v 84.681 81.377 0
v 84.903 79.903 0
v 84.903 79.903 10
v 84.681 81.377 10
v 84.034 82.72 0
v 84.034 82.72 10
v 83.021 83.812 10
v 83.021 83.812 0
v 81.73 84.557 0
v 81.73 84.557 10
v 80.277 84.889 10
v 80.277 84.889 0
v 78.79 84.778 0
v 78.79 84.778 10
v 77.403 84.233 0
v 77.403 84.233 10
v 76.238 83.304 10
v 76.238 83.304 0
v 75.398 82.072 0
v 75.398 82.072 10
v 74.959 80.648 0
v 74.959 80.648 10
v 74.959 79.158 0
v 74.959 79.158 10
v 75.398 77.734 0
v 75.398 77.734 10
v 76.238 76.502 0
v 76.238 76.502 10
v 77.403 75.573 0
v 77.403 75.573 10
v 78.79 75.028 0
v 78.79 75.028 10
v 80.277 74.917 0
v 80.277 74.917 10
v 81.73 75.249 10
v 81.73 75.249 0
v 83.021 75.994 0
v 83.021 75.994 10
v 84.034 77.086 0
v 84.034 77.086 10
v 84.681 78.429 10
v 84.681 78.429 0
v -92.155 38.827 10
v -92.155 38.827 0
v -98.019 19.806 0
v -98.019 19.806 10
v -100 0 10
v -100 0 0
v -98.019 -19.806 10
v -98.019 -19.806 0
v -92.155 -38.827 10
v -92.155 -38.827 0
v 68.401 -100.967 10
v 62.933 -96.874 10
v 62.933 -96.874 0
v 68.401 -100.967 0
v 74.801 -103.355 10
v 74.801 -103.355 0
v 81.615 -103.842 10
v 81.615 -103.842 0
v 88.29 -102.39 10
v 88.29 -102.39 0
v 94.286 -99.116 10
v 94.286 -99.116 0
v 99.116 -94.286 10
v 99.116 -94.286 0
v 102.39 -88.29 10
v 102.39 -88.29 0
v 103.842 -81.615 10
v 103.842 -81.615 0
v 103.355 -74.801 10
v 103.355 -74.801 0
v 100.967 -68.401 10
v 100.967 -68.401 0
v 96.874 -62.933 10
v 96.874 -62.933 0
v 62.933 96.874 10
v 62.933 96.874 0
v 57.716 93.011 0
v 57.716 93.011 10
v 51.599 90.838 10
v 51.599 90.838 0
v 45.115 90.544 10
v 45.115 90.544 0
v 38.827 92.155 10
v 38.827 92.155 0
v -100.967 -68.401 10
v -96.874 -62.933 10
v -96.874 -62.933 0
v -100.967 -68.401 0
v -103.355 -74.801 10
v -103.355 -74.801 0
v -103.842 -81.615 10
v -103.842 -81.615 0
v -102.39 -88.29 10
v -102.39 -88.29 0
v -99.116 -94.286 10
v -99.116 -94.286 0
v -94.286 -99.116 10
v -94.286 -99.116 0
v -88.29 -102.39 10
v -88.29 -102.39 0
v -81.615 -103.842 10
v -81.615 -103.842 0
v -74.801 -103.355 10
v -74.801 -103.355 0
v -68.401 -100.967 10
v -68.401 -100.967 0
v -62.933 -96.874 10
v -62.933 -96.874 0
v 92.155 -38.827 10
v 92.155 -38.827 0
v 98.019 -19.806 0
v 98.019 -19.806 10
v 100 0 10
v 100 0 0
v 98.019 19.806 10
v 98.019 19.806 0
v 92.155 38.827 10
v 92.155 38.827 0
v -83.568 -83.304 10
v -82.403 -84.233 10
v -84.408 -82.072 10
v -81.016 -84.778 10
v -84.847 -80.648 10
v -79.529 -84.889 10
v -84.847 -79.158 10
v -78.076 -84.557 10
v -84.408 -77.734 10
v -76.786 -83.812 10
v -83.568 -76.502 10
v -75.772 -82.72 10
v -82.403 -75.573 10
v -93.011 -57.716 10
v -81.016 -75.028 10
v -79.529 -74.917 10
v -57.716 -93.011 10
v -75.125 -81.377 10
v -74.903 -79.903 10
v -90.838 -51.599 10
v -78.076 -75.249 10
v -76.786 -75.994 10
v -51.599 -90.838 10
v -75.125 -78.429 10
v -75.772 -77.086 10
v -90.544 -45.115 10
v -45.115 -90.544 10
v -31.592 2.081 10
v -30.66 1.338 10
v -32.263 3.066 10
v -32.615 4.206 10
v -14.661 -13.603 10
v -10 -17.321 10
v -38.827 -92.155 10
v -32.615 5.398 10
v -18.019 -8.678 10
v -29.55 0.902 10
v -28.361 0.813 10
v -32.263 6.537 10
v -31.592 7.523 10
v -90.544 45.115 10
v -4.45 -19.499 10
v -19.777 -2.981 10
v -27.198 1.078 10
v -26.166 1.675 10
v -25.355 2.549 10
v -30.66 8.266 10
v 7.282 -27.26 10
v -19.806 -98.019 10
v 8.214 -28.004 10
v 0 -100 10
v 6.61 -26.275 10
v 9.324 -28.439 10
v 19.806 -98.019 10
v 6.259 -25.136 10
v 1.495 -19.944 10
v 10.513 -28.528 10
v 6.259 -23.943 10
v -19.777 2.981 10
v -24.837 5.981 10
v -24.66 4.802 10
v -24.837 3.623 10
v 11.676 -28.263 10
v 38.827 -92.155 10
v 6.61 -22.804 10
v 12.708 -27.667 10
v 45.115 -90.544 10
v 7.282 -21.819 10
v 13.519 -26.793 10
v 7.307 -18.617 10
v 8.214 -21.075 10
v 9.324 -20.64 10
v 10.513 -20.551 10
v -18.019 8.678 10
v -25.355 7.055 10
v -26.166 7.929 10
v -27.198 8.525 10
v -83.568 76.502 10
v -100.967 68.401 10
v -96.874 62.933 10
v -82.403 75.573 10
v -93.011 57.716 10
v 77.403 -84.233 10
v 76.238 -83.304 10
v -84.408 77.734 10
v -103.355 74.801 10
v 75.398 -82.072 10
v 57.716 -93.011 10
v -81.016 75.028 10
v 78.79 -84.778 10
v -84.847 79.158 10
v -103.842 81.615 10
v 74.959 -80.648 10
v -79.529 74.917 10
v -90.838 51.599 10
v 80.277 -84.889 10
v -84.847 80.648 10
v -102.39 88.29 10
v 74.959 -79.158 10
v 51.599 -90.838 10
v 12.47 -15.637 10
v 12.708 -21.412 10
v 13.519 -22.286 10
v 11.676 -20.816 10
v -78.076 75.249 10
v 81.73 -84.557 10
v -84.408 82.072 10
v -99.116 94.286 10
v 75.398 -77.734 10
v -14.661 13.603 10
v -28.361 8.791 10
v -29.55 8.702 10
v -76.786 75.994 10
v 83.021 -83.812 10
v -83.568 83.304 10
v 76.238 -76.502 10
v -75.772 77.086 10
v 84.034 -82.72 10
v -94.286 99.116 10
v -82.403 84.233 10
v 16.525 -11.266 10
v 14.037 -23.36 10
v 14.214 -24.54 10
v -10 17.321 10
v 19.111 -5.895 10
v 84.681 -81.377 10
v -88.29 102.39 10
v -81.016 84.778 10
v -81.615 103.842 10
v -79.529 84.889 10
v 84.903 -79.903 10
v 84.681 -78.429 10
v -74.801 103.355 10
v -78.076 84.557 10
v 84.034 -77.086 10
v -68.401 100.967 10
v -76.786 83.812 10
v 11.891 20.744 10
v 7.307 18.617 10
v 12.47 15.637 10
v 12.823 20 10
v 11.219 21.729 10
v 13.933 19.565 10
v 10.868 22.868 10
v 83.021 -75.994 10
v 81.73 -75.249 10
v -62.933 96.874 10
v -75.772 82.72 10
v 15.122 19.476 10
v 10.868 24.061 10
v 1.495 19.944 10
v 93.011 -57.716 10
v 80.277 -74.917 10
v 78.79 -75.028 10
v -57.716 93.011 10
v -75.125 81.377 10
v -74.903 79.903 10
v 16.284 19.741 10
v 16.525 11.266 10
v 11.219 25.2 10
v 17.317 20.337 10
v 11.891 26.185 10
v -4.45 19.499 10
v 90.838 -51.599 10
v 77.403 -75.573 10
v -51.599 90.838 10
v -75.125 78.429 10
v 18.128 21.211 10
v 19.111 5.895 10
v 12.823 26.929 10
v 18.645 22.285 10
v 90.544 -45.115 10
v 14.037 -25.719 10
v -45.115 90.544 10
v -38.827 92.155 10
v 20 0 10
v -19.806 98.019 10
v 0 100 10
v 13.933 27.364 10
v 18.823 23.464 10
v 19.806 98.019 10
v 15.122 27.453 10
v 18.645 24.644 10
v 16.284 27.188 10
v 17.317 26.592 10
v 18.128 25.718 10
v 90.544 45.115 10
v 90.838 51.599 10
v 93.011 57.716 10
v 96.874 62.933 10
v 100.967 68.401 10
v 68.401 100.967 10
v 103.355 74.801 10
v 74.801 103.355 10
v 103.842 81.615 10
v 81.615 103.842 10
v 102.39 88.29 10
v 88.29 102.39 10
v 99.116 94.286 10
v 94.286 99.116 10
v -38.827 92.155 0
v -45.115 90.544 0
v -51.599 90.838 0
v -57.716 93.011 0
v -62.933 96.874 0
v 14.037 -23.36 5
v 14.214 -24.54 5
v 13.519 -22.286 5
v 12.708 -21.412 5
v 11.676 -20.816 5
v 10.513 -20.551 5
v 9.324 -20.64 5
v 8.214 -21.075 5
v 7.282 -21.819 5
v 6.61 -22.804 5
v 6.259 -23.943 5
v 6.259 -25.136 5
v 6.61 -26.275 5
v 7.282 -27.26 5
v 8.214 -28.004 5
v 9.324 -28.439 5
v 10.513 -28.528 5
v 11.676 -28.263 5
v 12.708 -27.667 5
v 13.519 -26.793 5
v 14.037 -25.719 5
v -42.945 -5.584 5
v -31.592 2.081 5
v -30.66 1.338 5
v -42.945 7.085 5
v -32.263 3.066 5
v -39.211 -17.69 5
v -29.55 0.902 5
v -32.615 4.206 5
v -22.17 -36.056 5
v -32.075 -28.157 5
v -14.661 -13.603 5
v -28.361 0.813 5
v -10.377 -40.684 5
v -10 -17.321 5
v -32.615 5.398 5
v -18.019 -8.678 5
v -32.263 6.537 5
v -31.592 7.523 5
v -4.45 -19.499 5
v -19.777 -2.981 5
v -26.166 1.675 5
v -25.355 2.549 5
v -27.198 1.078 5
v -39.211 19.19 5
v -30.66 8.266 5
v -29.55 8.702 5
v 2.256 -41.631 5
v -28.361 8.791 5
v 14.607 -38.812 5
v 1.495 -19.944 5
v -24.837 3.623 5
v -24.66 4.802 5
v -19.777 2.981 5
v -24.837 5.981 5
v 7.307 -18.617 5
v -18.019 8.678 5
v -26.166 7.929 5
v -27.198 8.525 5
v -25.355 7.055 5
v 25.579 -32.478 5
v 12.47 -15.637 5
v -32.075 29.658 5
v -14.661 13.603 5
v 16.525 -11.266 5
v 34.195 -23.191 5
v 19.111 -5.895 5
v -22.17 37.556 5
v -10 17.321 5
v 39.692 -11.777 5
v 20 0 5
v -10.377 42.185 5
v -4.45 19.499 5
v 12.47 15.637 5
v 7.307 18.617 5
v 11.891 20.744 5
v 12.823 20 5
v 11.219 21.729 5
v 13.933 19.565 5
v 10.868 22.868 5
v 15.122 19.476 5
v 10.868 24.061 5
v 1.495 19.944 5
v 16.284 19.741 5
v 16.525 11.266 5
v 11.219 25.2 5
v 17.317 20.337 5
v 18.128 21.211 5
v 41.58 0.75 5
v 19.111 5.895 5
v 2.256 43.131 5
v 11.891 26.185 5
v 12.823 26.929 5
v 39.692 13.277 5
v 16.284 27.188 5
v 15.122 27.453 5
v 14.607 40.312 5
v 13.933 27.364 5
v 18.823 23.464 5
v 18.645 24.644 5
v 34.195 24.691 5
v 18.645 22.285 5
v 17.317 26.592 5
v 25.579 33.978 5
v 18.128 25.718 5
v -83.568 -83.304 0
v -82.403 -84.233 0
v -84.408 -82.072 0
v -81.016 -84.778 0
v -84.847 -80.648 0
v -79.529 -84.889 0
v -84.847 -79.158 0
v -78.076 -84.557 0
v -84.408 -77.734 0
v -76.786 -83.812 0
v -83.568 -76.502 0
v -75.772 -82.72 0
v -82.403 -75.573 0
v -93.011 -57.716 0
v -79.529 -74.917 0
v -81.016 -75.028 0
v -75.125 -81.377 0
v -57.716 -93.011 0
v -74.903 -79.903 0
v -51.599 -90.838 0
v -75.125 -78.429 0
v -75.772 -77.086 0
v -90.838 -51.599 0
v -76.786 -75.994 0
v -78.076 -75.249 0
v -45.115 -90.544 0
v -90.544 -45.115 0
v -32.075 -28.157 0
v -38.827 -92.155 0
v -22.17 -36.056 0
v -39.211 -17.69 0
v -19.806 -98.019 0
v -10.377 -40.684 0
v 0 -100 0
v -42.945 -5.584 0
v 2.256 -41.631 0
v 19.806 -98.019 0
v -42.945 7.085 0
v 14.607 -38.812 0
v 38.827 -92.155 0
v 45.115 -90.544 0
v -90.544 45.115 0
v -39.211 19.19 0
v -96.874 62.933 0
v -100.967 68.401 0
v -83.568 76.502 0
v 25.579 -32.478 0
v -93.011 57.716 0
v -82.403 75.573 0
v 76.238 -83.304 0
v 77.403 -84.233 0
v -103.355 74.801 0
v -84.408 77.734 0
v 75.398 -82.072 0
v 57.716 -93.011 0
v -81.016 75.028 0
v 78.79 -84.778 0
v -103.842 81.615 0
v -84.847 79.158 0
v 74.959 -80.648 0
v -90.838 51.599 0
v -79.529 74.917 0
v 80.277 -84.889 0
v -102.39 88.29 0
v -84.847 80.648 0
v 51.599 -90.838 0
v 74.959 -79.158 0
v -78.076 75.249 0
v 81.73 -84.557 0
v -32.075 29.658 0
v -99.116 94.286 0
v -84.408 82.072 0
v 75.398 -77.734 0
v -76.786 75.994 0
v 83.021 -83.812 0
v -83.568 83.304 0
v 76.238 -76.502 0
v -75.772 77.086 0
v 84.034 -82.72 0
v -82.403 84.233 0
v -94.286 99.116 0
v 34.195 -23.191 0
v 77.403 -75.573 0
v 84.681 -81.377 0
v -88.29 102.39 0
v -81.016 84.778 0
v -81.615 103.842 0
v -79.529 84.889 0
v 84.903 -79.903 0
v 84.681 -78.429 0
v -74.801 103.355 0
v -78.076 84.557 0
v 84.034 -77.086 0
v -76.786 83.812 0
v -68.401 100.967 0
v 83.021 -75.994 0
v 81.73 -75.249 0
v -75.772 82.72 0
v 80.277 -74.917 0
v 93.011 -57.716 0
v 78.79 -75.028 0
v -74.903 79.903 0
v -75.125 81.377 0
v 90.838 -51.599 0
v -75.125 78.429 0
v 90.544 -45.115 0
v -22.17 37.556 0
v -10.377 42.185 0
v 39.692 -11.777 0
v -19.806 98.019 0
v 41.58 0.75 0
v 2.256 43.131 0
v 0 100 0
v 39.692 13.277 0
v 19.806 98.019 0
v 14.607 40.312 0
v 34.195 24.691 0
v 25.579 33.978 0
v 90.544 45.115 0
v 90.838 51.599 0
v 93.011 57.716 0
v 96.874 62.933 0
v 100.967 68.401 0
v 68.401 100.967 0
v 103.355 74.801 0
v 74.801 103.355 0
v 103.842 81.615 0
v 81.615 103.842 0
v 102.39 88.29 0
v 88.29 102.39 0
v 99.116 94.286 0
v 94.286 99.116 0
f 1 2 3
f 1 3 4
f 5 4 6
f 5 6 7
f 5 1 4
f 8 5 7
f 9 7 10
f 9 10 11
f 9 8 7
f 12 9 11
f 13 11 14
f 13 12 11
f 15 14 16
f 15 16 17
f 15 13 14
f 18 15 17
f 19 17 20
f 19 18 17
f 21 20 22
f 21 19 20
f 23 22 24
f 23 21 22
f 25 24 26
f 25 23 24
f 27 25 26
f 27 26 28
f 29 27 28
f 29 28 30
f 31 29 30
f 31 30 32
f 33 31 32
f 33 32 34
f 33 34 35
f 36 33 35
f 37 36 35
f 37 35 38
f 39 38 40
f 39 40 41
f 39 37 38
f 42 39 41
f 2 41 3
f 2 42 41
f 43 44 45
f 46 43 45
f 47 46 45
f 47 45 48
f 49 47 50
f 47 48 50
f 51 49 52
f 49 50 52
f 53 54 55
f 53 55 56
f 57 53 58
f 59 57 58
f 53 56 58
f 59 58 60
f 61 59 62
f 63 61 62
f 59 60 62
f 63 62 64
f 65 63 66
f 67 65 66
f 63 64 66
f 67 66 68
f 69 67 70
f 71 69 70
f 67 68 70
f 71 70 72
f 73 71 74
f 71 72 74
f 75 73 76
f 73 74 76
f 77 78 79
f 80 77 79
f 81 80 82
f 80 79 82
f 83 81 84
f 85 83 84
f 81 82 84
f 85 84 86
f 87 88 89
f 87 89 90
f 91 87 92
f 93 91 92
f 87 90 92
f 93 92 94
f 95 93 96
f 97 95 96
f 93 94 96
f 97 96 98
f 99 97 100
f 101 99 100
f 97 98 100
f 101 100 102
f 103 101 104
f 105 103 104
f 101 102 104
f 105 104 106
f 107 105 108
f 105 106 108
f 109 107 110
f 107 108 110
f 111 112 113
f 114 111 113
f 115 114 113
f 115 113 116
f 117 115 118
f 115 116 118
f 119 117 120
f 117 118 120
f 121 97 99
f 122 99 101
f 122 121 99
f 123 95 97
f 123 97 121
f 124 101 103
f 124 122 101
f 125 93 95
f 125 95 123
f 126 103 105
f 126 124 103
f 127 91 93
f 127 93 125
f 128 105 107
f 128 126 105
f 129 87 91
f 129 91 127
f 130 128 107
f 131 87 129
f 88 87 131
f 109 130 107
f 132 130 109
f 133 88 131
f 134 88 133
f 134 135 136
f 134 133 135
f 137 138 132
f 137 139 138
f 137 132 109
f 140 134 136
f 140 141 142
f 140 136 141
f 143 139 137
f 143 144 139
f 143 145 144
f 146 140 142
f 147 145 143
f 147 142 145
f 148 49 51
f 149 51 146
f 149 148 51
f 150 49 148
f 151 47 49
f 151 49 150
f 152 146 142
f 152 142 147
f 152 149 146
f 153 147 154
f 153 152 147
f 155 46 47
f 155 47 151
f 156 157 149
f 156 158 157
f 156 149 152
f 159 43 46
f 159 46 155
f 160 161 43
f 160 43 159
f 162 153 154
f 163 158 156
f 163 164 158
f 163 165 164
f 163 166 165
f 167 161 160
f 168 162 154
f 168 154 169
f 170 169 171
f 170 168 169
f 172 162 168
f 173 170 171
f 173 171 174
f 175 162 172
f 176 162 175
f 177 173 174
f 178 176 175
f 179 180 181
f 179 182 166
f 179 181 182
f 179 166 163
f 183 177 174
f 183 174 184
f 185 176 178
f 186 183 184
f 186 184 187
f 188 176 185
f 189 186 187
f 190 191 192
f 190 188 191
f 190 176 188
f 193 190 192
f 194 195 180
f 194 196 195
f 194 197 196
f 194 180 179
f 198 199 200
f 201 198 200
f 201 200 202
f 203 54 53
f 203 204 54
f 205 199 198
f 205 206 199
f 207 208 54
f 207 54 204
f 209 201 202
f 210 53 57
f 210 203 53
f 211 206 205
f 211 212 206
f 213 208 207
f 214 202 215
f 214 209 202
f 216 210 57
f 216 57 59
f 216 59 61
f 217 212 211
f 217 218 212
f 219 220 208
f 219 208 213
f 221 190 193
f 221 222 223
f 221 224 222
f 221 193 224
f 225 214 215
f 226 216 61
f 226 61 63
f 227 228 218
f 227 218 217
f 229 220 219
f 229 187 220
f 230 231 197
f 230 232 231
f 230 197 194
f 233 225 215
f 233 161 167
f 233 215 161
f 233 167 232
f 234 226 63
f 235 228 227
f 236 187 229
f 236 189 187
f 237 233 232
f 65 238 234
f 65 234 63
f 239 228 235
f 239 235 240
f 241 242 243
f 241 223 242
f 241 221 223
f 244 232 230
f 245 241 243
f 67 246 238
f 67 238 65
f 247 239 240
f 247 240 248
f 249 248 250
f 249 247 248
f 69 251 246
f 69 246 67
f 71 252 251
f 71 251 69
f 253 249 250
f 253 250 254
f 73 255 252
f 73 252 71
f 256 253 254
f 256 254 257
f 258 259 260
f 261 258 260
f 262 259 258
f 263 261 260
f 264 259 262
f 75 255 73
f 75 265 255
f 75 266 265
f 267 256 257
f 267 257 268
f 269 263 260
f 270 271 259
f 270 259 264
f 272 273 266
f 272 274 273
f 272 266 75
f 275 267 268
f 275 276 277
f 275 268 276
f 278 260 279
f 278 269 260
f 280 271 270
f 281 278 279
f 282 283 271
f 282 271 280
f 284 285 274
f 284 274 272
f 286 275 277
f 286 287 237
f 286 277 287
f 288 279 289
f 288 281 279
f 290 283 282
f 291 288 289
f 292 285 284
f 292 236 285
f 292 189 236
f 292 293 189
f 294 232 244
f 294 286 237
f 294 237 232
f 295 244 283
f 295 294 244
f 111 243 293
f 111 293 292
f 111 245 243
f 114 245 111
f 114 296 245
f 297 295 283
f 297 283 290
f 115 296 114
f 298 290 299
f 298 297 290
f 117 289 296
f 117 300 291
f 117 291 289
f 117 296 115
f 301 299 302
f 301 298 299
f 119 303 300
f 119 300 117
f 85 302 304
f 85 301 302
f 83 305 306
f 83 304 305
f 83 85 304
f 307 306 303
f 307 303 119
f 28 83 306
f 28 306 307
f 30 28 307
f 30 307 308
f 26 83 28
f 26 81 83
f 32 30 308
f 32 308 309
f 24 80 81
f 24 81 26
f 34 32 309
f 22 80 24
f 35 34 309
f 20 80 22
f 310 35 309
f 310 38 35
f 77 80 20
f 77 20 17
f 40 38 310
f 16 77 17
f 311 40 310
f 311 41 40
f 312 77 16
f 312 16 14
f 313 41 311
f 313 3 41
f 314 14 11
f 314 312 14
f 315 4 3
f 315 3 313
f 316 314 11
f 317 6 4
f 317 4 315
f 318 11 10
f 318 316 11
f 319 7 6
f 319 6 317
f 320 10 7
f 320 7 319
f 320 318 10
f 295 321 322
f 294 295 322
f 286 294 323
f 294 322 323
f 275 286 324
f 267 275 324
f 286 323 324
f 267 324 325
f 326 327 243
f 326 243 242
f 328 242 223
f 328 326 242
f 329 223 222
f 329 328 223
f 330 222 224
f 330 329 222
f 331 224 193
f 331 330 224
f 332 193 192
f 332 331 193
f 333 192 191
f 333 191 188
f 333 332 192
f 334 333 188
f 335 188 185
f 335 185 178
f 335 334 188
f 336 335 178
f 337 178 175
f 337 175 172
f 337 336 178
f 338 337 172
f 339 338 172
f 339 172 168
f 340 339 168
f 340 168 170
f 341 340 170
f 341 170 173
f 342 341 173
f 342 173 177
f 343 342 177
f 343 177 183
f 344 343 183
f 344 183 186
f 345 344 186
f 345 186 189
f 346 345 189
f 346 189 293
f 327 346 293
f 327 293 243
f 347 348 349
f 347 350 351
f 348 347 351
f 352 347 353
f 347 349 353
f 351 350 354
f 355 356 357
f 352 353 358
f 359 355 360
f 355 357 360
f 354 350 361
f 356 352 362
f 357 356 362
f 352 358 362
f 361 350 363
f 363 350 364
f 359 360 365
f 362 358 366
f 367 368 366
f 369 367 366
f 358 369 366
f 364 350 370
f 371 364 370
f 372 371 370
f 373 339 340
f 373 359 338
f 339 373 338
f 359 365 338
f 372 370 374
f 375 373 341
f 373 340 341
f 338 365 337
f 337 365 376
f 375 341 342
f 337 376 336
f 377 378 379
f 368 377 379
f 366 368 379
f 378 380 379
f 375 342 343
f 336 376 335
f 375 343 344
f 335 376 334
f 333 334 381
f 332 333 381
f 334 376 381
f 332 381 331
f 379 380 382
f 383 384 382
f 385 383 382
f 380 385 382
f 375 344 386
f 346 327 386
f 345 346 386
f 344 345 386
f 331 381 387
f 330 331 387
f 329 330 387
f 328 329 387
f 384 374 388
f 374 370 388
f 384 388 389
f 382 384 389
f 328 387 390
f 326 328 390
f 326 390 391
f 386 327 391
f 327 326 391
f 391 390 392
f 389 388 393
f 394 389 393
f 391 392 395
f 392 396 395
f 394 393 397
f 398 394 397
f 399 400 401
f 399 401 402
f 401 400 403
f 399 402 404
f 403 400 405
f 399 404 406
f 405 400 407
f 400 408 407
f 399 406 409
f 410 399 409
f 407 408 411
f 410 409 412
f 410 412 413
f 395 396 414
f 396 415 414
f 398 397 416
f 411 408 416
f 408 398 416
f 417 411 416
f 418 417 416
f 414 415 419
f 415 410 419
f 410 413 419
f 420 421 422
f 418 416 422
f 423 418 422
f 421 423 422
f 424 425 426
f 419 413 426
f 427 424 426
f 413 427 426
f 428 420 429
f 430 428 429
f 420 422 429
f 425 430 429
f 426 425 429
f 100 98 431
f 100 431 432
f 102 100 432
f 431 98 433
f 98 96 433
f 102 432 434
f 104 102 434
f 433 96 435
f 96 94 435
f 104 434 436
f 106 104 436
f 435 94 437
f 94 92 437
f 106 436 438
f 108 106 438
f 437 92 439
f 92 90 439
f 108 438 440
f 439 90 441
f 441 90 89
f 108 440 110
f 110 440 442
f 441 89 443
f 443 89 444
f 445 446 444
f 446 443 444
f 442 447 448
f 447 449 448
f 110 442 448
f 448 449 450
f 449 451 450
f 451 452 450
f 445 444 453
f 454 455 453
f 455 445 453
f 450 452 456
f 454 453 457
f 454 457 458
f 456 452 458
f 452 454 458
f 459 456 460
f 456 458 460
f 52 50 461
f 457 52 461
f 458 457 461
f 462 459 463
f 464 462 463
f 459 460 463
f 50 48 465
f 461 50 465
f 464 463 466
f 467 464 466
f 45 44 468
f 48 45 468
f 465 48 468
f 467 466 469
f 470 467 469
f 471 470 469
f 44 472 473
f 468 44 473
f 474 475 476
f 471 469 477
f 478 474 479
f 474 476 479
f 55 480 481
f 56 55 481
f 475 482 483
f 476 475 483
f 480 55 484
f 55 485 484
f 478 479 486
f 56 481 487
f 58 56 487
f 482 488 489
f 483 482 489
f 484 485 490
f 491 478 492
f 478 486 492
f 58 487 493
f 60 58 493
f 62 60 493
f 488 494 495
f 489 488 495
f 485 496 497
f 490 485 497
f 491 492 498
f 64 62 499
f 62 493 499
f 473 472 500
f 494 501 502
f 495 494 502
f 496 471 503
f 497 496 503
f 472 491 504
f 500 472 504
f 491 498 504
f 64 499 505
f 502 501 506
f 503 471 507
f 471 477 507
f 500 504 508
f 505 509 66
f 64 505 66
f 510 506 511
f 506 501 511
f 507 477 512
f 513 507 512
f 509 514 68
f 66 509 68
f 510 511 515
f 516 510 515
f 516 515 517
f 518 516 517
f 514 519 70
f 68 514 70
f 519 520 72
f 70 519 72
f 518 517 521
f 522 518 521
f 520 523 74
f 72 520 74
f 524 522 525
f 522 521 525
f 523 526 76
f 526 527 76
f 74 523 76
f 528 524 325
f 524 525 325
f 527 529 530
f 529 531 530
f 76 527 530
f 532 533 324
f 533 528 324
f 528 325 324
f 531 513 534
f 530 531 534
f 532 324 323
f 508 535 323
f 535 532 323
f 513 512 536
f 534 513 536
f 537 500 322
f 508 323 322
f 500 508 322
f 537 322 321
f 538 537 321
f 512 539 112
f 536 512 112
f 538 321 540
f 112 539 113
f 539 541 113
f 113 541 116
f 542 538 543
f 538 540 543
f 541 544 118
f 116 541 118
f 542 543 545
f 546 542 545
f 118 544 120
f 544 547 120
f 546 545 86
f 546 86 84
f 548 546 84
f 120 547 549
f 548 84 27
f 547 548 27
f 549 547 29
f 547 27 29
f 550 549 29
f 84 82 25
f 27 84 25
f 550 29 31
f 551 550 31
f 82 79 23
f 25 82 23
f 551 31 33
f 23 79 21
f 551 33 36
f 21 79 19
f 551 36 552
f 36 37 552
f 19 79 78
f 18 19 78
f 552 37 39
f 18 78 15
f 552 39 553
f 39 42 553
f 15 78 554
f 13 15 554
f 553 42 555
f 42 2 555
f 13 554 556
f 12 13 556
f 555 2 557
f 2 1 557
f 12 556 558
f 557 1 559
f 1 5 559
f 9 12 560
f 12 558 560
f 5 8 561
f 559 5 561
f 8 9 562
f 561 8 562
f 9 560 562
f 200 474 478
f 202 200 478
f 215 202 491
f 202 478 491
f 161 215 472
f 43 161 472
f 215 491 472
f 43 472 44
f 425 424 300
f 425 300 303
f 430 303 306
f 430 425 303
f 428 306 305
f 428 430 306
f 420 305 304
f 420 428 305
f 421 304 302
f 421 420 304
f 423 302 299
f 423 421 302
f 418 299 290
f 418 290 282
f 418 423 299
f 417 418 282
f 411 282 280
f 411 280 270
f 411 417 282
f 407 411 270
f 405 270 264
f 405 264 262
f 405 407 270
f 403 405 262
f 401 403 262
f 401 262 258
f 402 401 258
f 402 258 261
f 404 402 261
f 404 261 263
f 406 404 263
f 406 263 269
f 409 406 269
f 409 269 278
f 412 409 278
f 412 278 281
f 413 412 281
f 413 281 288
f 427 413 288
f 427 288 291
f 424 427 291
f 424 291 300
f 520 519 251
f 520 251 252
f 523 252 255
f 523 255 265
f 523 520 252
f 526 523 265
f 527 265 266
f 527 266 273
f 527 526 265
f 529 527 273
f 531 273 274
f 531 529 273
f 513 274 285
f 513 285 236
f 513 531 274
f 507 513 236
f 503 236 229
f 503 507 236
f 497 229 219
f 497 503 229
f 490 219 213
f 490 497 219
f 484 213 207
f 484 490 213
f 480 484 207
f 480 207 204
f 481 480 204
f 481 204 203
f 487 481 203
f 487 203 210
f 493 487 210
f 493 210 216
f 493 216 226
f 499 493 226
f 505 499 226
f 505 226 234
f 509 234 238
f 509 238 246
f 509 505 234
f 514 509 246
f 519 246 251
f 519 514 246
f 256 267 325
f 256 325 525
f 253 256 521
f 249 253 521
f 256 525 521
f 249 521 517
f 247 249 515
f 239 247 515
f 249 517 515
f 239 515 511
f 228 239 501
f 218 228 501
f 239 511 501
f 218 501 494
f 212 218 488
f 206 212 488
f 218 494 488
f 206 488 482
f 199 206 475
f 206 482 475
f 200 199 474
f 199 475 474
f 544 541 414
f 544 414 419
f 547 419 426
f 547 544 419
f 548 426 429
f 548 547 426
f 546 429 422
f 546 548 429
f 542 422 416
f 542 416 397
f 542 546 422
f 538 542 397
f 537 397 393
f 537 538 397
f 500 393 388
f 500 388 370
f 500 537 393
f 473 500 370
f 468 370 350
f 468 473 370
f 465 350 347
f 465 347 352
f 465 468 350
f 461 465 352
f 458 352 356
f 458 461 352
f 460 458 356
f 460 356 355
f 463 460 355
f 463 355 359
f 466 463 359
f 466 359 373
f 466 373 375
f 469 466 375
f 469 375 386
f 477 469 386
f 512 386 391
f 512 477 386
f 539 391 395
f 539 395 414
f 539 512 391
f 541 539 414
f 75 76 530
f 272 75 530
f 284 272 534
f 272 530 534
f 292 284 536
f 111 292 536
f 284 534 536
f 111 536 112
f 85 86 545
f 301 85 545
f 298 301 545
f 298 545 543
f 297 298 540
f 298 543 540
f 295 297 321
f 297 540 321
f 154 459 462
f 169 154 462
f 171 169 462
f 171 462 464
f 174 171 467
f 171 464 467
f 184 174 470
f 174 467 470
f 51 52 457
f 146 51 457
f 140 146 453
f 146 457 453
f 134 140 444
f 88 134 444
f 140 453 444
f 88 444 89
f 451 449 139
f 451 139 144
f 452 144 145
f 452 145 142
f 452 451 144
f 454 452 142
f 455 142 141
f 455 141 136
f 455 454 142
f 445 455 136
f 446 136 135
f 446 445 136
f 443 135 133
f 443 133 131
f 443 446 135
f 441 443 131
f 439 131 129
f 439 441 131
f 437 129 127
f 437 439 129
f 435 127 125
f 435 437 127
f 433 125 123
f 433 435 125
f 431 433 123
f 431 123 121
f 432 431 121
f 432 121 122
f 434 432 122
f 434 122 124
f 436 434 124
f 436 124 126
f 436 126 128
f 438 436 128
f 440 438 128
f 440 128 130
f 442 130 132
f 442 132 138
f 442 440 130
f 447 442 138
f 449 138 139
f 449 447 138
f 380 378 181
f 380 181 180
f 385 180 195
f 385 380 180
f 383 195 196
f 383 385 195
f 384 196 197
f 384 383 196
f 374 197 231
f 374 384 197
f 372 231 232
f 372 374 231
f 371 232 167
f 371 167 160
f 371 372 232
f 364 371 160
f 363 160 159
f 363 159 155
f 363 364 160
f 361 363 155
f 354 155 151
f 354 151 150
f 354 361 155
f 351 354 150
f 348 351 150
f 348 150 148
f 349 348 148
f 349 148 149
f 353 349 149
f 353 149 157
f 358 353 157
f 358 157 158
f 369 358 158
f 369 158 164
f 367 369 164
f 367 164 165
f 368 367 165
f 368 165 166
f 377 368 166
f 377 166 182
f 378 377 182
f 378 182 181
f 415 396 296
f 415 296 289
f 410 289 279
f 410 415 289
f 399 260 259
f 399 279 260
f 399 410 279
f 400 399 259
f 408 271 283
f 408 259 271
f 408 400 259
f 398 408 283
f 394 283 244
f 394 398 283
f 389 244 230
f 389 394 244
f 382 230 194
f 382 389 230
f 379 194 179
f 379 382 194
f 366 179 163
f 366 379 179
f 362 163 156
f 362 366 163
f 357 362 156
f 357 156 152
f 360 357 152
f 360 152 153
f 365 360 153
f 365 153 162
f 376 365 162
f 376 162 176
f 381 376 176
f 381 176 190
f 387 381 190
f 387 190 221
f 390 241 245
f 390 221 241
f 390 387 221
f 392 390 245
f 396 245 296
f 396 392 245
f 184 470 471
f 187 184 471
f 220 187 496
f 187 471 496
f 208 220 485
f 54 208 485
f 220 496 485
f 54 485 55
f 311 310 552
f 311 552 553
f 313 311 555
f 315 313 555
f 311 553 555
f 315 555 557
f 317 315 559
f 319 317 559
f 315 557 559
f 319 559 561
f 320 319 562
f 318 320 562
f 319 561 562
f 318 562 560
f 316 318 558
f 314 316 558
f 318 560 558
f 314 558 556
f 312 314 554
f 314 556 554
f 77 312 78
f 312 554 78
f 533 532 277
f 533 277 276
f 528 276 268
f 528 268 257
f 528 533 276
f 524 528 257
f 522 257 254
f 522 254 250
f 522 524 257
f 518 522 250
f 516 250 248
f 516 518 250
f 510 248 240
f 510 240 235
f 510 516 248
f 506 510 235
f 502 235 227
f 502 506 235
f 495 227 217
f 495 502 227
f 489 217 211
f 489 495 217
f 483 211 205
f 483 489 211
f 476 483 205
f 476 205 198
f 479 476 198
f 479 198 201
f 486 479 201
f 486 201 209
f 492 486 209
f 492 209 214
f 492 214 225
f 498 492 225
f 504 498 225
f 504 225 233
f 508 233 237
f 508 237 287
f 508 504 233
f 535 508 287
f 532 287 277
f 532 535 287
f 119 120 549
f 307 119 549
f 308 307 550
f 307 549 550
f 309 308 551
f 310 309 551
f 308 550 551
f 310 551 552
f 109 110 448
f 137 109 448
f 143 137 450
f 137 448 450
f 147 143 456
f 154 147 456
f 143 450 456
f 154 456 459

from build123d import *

# Parameters (mm, degrees)
SKETCH1_R               = 5
SKETCH1_R_2             = 4
BOSS_EXTRUDE1_DEPTH     = 10
SKETCH3_R               = 20
CUT_EXTRUDE4_DEPTH      = 11
CUT_EXTRUDE4_DEPTH_BACK = 1
SKETCH6_R               = 42.5
CUT_EXTRUDE5_DEPTH      = 5


with BuildPart() as part:
    # Sketch1 → Boss-Extrude1 (new body)
    with BuildSketch(Plane.XY):
        with BuildLine():
            ThreePointArc((62.932503526, 96.873629023), (51.59941337, 90.83800352), (38.827006486, 92.154563465))
            ThreePointArc((38.827006486, 92.154563465), (0, 100), (-38.827006486, 92.154563465))
            ThreePointArc((-38.827006486, 92.154563465), (-51.59941337, 90.83800352), (-62.932503526, 96.873629023))
            ThreePointArc((-62.932503526, 96.873629023), (-96.873629023, 96.873629023), (-96.873629023, 62.932503526))
            ThreePointArc((-96.873629023, 62.932503526), (-90.83800352, 51.59941337), (-92.154563465, 38.827006486))
            ThreePointArc((-92.154563465, 38.827006486), (-100, 0), (-92.154563465, -38.827006486))
            ThreePointArc((-92.154563465, -38.827006486), (-90.83800352, -51.59941337), (-96.873629023, -62.932503526))
            ThreePointArc((-96.873629023, -62.932503526), (-96.873629023, -96.873629023), (-62.932503526, -96.873629023))
            ThreePointArc((-62.932503526, -96.873629023), (-51.59941337, -90.83800352), (-38.827006486, -92.154563465))
            ThreePointArc((-38.827006486, -92.154563465), (0, -100), (38.827006486, -92.154563465))
            ThreePointArc((38.827006486, -92.154563465), (51.59941337, -90.83800352), (62.932503526, -96.873629023))
            ThreePointArc((62.932503526, -96.873629023), (96.873629023, -96.873629023), (96.873629023, -62.932503526))
            ThreePointArc((96.873629023, -62.932503526), (90.83800352, -51.59941337), (92.154563465, -38.827006486))
            ThreePointArc((92.154563465, -38.827006486), (100, 0), (92.154563465, 38.827006486))
            ThreePointArc((92.154563465, 38.827006486), (90.83800352, 51.59941337), (96.873629023, 62.932503526))
            ThreePointArc((96.873629023, 62.932503526), (96.873629023, 96.873629023), (62.932503526, 96.873629023))
        make_face()
        with Locations((-79.903066991, 79.903065557)):
            Circle(SKETCH1_R, mode=Mode.SUBTRACT)
        with Locations((-79.903066274, -79.903067707)):
            Circle(SKETCH1_R, mode=Mode.SUBTRACT)
        with Locations((79.903066274, 79.903066274)):
            Circle(SKETCH1_R, mode=Mode.SUBTRACT)
        with Locations((79.903066991, -79.903066991)):
            Circle(SKETCH1_R, mode=Mode.SUBTRACT)
        with Locations((-28.659563911, 4.801920664)):
            Circle(SKETCH1_R_2, mode=Mode.SUBTRACT)
        with Locations((10.214266366, -24.539516671)):
            Circle(SKETCH1_R_2, mode=Mode.SUBTRACT)
        with Locations((14.823001416, 23.464491412)):
            Circle(SKETCH1_R_2, mode=Mode.SUBTRACT)
    extrude(amount=BOSS_EXTRUDE1_DEPTH)

    # Sketch3 → Cut-Extrude4 (cut, two sides)
    with BuildSketch(Plane.XY) as cut_extrude4_sk:
        Circle(SKETCH3_R)
    extrude(amount=CUT_EXTRUDE4_DEPTH, mode=Mode.SUBTRACT)
    extrude(cut_extrude4_sk.sketch, amount=-CUT_EXTRUDE4_DEPTH_BACK, mode=Mode.SUBTRACT)

    # Sketch6 → Cut-Extrude5 (cut)
    with BuildSketch(Plane.XY):
        with Locations((-0.919801826, 0.750296012)):
            Circle(SKETCH6_R)
    extrude(amount=CUT_EXTRUDE5_DEPTH, mode=Mode.SUBTRACT)


solid = part.part
